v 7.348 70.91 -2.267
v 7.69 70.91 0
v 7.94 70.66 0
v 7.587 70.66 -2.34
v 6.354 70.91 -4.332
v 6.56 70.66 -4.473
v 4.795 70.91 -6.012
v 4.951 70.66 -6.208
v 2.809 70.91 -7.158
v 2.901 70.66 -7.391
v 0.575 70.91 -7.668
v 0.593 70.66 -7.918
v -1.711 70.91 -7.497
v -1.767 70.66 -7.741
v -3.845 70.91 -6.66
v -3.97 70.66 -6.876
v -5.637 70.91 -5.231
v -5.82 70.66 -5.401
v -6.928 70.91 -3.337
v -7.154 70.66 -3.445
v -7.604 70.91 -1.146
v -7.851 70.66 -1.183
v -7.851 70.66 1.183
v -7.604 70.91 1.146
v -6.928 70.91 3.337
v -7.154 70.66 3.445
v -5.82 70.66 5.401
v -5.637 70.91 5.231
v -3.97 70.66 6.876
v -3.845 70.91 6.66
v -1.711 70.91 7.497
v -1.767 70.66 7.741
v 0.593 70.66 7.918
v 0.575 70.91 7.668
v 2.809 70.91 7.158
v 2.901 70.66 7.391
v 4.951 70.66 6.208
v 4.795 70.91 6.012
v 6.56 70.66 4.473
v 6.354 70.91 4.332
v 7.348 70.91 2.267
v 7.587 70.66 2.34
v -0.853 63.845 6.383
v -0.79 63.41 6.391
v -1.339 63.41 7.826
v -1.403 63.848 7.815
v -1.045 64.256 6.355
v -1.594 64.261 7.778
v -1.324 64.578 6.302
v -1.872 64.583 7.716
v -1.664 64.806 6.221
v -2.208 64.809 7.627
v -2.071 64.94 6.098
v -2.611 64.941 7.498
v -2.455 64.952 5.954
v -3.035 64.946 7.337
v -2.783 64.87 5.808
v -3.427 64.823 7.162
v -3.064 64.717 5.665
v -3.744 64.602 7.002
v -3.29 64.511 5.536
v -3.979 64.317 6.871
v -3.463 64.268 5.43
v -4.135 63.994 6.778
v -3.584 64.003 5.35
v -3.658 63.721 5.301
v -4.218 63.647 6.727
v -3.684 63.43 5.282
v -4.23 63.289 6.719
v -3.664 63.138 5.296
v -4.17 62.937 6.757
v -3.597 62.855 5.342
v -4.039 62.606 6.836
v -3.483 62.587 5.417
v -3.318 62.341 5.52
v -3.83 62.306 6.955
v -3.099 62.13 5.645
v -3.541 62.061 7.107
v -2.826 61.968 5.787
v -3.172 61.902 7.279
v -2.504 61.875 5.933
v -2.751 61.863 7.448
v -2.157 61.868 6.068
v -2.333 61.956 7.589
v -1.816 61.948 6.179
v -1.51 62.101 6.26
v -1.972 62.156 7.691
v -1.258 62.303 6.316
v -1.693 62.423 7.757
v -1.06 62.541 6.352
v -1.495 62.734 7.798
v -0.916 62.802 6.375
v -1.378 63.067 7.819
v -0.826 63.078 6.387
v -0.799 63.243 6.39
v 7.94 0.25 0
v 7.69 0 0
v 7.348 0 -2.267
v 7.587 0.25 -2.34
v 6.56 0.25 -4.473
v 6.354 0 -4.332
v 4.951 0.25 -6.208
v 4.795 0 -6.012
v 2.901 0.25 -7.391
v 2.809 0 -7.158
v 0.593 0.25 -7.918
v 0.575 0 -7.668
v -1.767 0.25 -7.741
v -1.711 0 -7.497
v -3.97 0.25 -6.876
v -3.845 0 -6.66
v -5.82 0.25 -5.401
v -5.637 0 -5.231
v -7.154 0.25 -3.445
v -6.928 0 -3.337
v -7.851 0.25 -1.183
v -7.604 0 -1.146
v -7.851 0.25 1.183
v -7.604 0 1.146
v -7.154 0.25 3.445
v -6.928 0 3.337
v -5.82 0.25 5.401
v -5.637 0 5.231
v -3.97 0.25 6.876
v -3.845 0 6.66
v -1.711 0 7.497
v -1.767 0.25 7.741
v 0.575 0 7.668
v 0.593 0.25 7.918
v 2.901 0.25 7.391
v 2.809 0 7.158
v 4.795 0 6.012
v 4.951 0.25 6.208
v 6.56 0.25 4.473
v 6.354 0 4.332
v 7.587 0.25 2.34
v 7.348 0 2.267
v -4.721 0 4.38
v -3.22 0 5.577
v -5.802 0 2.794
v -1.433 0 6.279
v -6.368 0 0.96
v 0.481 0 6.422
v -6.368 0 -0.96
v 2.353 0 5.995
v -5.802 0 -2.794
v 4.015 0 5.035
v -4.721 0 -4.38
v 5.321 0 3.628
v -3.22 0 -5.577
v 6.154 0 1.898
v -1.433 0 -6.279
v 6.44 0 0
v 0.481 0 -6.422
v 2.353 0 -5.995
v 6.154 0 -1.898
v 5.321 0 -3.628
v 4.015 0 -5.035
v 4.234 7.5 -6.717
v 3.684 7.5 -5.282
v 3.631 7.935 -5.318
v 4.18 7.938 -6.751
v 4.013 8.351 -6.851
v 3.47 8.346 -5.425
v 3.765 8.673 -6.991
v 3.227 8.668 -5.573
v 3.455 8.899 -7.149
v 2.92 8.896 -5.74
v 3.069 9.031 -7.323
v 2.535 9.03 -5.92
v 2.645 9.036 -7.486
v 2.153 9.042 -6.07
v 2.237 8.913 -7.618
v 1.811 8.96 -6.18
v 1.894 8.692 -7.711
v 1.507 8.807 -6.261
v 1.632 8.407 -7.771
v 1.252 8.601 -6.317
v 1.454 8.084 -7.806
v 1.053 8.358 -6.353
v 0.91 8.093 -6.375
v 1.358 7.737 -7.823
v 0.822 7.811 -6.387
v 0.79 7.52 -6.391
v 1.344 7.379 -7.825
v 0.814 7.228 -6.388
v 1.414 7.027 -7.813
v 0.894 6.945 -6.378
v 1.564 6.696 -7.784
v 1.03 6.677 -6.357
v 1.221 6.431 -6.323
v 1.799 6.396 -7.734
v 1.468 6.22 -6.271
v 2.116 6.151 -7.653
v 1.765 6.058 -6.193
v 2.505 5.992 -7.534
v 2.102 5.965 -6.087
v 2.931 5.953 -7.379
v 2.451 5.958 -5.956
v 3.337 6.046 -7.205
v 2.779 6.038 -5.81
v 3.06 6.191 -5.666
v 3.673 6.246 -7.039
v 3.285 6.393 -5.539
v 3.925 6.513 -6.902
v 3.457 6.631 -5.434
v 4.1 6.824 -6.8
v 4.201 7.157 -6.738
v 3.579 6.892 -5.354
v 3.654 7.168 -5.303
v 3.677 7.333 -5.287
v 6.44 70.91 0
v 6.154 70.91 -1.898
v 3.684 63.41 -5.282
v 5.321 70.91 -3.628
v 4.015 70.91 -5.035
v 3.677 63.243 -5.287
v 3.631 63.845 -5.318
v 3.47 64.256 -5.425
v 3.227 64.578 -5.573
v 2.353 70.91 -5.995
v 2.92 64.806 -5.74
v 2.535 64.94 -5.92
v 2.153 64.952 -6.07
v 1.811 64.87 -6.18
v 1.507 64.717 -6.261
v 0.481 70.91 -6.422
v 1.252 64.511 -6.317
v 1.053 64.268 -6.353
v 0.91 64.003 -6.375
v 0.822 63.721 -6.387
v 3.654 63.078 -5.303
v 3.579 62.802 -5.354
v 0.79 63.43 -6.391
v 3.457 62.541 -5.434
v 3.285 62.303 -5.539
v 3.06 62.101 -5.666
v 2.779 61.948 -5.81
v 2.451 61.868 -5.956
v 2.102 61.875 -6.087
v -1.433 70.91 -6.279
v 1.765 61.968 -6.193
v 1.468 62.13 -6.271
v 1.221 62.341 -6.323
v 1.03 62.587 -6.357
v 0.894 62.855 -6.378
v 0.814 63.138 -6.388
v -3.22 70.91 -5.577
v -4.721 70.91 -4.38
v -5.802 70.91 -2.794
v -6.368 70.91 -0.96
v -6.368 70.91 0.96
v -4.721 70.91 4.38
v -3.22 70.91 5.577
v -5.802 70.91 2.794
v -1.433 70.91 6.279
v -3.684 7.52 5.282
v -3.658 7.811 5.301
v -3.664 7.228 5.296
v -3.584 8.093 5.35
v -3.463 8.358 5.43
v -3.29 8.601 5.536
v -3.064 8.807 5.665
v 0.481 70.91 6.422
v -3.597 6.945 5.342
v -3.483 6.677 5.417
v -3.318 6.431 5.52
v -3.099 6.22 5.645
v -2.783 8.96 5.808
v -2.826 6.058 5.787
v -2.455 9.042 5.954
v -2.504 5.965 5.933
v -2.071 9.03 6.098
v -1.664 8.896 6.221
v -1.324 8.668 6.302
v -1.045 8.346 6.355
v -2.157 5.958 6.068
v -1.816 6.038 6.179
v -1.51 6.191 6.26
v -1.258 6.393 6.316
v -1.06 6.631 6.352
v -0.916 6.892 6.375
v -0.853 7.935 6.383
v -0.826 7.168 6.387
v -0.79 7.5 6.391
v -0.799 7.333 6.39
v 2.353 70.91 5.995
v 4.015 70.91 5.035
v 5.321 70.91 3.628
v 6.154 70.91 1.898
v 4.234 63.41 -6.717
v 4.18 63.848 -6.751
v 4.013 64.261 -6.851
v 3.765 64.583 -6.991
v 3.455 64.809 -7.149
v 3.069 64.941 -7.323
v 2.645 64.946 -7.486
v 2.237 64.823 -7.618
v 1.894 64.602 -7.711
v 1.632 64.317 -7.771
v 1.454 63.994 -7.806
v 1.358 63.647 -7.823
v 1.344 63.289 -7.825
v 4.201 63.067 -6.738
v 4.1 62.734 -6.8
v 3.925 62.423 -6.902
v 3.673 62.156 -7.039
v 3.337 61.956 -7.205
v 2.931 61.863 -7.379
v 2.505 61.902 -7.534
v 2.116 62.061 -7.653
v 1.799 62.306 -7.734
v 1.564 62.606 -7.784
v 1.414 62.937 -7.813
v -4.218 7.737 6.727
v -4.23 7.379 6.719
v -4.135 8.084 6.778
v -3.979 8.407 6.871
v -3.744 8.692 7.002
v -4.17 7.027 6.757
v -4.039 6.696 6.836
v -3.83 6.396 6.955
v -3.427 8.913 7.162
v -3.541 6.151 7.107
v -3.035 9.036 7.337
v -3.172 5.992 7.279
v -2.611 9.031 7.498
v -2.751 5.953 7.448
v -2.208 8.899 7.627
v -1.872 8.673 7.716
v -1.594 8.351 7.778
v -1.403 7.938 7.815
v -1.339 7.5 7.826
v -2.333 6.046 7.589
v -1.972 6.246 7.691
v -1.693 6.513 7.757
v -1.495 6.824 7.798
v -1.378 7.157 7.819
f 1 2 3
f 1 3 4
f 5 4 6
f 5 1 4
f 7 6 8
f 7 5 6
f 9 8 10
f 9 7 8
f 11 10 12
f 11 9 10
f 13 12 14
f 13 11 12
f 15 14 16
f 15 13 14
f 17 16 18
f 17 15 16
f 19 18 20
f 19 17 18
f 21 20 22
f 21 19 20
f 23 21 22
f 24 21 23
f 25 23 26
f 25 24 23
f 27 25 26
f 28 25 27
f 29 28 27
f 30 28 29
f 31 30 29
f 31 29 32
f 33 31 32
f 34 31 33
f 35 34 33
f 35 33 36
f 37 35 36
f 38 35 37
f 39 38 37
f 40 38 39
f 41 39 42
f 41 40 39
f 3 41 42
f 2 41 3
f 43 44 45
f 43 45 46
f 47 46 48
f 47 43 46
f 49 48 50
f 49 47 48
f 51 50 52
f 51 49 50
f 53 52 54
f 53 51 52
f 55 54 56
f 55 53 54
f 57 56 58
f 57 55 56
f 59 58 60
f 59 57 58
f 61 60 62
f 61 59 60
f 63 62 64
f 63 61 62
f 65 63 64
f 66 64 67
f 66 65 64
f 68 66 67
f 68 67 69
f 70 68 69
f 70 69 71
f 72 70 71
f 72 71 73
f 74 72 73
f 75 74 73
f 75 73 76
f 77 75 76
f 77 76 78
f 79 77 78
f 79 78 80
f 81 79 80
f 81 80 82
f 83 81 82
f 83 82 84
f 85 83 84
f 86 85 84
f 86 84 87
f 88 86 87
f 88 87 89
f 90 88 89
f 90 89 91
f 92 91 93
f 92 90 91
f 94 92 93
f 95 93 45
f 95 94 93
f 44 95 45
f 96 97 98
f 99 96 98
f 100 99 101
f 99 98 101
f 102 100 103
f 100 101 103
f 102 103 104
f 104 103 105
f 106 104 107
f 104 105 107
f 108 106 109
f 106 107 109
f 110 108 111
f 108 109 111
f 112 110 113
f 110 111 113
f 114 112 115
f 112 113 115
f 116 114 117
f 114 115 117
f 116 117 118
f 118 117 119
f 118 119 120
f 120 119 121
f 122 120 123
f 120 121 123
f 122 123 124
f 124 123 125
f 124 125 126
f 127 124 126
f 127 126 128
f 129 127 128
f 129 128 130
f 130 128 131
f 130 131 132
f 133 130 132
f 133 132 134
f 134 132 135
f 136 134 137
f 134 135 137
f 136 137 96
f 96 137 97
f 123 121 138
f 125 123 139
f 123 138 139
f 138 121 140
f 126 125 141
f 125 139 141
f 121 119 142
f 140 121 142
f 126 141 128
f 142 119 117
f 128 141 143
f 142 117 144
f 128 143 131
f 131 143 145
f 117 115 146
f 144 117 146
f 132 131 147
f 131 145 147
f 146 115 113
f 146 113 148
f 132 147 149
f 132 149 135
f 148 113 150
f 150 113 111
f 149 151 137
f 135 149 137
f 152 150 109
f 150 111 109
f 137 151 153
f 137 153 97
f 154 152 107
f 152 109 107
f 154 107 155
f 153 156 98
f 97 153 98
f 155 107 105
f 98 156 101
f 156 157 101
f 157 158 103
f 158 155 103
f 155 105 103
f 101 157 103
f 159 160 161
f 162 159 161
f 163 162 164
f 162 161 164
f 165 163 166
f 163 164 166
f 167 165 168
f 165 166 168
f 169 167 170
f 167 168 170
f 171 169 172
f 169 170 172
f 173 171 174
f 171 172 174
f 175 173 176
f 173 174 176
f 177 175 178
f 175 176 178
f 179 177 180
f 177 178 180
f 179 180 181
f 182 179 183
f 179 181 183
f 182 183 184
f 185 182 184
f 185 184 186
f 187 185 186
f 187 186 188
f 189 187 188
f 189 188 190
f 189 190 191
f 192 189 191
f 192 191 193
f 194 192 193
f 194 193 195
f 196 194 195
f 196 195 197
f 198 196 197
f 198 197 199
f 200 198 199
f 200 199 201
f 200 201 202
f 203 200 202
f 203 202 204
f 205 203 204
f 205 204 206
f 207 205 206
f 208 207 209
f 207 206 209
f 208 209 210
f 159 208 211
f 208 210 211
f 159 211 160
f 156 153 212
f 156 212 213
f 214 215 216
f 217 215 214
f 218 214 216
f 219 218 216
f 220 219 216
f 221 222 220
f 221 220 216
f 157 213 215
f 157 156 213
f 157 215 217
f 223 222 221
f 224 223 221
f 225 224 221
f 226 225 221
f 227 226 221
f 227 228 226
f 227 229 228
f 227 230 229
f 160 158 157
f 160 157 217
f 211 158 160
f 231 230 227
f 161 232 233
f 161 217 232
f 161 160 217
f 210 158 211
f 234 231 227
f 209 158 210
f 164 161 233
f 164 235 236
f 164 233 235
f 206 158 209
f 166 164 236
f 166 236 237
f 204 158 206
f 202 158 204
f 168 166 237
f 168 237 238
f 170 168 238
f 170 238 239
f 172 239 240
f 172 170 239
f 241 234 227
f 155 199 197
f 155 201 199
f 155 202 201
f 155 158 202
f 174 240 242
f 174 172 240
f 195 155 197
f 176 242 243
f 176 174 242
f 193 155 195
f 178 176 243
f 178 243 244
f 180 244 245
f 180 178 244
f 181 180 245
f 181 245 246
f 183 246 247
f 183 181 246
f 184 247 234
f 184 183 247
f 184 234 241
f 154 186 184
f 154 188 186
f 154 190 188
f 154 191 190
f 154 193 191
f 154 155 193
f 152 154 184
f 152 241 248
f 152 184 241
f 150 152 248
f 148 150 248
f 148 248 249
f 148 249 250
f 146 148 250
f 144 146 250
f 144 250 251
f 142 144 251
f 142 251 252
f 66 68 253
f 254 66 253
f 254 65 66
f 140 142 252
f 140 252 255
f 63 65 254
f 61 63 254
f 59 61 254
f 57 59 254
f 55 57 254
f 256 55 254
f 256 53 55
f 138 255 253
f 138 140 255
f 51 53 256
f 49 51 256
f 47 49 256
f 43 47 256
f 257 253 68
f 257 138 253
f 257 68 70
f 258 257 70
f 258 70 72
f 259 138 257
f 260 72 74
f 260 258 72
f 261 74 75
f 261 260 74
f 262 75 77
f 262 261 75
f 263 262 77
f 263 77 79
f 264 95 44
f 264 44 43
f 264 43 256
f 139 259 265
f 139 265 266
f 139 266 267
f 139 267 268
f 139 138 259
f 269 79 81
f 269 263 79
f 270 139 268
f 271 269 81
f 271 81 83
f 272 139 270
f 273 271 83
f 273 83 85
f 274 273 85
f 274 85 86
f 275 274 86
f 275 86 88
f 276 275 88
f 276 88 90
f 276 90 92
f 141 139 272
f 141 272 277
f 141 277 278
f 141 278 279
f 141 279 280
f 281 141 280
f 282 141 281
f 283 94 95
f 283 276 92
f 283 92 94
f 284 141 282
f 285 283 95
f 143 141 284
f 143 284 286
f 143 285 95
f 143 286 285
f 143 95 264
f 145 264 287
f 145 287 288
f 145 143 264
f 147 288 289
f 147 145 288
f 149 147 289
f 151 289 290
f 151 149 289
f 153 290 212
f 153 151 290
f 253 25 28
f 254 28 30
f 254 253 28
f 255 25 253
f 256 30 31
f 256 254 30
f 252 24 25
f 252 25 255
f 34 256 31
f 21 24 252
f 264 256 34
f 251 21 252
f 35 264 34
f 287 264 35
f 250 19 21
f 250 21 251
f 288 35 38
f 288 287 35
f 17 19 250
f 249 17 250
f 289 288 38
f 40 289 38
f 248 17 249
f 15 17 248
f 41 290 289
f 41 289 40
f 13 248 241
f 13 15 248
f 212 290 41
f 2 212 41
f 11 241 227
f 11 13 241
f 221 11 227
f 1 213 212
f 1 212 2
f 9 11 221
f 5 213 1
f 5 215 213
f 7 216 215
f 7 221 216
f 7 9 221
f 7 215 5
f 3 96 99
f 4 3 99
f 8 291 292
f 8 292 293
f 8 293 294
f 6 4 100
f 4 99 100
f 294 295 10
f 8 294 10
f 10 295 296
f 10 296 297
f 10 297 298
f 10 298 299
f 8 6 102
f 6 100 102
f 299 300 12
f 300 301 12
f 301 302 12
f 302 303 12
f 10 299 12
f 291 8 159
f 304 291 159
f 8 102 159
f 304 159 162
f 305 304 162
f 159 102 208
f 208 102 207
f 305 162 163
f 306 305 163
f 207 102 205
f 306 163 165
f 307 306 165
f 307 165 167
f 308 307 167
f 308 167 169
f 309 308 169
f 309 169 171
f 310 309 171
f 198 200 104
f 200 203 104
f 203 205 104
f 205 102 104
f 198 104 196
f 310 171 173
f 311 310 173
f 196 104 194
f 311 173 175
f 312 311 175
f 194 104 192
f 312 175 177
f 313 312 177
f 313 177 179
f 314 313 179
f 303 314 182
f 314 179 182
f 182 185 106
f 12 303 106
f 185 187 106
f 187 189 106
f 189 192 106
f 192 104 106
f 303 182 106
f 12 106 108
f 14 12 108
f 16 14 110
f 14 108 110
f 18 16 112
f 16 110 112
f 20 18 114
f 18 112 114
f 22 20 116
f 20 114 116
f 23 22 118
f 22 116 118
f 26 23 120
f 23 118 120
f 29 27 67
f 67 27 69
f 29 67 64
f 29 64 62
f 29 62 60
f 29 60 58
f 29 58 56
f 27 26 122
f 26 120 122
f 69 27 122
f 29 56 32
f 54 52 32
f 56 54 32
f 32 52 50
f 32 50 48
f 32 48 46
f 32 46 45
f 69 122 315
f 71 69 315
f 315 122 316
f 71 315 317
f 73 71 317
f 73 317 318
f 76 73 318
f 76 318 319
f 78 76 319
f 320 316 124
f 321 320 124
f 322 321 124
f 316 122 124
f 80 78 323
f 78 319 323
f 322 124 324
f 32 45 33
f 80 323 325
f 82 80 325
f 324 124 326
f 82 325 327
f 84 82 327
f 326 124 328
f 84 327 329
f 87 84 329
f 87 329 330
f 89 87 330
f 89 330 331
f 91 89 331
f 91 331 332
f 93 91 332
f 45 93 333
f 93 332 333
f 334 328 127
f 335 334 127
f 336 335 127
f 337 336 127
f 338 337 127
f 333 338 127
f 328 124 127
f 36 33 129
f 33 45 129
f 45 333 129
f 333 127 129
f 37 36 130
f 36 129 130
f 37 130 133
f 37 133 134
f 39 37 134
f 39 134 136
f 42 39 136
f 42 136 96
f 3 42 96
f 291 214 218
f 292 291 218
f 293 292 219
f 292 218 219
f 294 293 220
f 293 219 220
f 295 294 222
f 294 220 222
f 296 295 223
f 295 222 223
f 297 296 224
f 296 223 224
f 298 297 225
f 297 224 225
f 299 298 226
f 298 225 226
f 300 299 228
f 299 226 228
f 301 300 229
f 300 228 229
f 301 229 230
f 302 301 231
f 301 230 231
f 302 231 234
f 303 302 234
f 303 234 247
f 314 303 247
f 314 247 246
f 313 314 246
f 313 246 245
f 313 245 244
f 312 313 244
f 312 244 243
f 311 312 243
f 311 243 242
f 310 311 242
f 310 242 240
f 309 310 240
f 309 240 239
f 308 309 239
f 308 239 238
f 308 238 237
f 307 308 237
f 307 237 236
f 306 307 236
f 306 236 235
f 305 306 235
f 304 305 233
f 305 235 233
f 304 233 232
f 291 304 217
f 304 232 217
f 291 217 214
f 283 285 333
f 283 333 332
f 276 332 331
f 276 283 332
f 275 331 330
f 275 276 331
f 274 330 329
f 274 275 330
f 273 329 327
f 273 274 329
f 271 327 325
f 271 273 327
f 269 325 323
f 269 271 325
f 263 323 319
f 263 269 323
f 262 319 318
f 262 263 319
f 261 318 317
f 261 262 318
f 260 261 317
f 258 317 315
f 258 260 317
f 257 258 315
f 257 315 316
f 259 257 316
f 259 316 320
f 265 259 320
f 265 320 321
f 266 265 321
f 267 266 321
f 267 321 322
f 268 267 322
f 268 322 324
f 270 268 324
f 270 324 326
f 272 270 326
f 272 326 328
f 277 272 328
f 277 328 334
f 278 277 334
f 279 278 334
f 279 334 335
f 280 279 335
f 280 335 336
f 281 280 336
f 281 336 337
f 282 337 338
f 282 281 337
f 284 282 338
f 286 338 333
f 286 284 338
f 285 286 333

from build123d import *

# Parameters (mm, degrees)
SKETCH1_R               = 7.94
SKETCH1_R_2             = 6.44
BOSS_EXTRUDE1_DEPTH     = 70.91
CHAMFER1_SIZE           = 0.25
SKETCH2_R               = 1.55
CUT_EXTRUDE1_DEPTH      = 5.405594573
CUT_EXTRUDE1_DEPTH_BACK = 17.105594573


with BuildPart() as part:
    # Sketch1 → Boss-Extrude1 (new body)
    with BuildSketch(Plane(origin=(0, 0, 0), x_dir=(1, 0, 0), z_dir=(0, 1, 0))):
        Circle(SKETCH1_R)
        Circle(SKETCH1_R_2, mode=Mode.SUBTRACT)
    extrude(amount=BOSS_EXTRUDE1_DEPTH)

    # Chamfer1
    chamfer1_edges = [part.edges().sort_by_distance(p)[0] for p in [
        (-7.94, 0, 0),
        (-7.94, 70.91, 0),
    ]]
    chamfer(chamfer1_edges, length=CHAMFER1_SIZE)

    # Sketch2 → Cut-Extrude1 (cut, two sides)
    with BuildSketch(Plane(origin=(-2.093493753, 0, 5.462580334), x_dir=(0.933774416, 0, 0.35786218), z_dir=(-0.35786218, 0, 0.933774416))) as cut_extrude1_sk:
        with Locations((0, 63.41)):
            Circle(SKETCH2_R)
        with Locations((0, 7.5)):
            Circle(SKETCH2_R)
    extrude(amount=CUT_EXTRUDE1_DEPTH, mode=Mode.SUBTRACT)
    extrude(cut_extrude1_sk.sketch, amount=-CUT_EXTRUDE1_DEPTH_BACK, mode=Mode.SUBTRACT)


solid = part.part
